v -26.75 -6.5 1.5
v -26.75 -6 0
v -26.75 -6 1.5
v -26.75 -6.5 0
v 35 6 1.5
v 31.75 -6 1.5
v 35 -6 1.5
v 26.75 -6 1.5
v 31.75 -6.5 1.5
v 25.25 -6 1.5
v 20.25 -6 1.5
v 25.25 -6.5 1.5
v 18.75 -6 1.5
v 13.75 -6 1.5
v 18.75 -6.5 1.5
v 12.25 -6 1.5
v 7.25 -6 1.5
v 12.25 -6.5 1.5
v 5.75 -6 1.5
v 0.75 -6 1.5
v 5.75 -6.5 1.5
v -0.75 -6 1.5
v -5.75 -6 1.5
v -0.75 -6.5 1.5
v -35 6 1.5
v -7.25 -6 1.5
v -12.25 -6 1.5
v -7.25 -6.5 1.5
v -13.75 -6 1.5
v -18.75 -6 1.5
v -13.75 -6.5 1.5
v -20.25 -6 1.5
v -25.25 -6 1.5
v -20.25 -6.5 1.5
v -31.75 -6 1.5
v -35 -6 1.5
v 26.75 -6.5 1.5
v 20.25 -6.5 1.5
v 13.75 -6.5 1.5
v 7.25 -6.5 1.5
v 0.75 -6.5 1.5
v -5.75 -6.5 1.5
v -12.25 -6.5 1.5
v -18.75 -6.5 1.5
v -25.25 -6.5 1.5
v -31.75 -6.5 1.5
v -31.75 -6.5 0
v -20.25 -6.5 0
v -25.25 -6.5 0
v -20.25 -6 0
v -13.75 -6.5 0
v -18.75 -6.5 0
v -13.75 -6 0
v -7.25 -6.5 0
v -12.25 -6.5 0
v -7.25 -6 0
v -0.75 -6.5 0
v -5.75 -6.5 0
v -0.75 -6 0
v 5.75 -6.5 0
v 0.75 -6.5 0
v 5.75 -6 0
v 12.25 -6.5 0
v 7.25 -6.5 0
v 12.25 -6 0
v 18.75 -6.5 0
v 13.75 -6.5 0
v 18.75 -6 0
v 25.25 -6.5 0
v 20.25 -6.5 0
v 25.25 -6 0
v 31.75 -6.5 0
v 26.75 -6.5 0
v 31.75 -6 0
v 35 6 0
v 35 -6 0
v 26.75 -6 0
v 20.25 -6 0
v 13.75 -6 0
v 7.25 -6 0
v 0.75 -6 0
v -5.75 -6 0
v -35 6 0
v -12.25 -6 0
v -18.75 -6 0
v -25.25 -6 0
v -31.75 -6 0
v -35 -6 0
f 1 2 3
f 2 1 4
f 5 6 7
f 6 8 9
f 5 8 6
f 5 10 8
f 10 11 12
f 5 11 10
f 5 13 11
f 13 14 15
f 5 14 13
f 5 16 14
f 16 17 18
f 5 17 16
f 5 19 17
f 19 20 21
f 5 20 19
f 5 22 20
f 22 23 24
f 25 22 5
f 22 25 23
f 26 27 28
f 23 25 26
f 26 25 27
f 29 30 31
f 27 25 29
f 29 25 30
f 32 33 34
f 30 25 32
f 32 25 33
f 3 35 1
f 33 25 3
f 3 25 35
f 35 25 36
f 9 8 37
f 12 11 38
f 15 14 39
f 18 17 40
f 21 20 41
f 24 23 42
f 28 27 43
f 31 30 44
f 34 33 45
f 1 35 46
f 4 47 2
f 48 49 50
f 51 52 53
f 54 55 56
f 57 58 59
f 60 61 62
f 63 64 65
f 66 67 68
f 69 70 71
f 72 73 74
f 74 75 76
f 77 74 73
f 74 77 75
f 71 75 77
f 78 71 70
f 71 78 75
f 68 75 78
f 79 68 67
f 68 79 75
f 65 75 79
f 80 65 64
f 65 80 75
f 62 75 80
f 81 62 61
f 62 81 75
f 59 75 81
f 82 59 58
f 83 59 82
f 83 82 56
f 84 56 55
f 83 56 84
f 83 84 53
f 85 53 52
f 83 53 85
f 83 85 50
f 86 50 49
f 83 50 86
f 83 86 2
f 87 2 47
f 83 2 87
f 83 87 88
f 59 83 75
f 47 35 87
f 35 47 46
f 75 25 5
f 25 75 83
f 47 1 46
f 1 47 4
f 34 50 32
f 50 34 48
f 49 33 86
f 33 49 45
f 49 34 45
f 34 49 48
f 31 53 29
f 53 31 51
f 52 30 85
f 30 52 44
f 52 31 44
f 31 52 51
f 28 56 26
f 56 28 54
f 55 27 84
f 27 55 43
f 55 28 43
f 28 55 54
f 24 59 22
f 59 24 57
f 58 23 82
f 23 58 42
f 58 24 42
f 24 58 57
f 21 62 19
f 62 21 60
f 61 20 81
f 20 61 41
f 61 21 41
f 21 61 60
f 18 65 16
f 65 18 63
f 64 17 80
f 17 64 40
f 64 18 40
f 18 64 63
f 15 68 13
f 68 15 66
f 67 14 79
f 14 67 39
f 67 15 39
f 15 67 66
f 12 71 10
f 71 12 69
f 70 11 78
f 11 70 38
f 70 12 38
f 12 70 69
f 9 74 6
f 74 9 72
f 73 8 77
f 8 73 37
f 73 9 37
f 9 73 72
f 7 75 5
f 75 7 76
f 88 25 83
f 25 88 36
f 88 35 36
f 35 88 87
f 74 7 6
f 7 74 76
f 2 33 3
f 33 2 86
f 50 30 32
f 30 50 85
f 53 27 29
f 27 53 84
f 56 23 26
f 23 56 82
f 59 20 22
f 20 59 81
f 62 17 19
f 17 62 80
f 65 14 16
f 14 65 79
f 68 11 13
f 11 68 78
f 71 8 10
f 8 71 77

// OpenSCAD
// 10-well comb for agarose gel casting
// Print orientation: flat on bed, teeth pointing down (-Y)

plate_t     = 1.5;   // plate thickness (Z)
spine_l     = 70;    // spine length (X)
spine_w     = 12;    // spine width (Y)
tooth_w     = 5.0;   // tooth width (X)
tooth_l     = 12;    // tooth length (Y)
tooth_count = 10;    // number of teeth
gap         = 1.5;   // gap between teeth (X)

pitch      = tooth_w + gap;          // centre-to-centre spacing
x_start    = -(tooth_count - 1) * pitch / 2;  // first tooth centre
overlap    = 0.5;                    // tooth embed into spine for a clean union

union() {
    // Spine (back bar)
    translate([-spine_l / 2, -spine_w / 2, 0])
        cube([spine_l, spine_w, plate_t]);

    // Teeth
    for (i = [0 : tooth_count - 1])
        translate([x_start + i * pitch - tooth_w / 2,
                   -spine_w / 2 - overlap,
                   0])
            cube([tooth_w, tooth_l + overlap, plate_t]);
}
